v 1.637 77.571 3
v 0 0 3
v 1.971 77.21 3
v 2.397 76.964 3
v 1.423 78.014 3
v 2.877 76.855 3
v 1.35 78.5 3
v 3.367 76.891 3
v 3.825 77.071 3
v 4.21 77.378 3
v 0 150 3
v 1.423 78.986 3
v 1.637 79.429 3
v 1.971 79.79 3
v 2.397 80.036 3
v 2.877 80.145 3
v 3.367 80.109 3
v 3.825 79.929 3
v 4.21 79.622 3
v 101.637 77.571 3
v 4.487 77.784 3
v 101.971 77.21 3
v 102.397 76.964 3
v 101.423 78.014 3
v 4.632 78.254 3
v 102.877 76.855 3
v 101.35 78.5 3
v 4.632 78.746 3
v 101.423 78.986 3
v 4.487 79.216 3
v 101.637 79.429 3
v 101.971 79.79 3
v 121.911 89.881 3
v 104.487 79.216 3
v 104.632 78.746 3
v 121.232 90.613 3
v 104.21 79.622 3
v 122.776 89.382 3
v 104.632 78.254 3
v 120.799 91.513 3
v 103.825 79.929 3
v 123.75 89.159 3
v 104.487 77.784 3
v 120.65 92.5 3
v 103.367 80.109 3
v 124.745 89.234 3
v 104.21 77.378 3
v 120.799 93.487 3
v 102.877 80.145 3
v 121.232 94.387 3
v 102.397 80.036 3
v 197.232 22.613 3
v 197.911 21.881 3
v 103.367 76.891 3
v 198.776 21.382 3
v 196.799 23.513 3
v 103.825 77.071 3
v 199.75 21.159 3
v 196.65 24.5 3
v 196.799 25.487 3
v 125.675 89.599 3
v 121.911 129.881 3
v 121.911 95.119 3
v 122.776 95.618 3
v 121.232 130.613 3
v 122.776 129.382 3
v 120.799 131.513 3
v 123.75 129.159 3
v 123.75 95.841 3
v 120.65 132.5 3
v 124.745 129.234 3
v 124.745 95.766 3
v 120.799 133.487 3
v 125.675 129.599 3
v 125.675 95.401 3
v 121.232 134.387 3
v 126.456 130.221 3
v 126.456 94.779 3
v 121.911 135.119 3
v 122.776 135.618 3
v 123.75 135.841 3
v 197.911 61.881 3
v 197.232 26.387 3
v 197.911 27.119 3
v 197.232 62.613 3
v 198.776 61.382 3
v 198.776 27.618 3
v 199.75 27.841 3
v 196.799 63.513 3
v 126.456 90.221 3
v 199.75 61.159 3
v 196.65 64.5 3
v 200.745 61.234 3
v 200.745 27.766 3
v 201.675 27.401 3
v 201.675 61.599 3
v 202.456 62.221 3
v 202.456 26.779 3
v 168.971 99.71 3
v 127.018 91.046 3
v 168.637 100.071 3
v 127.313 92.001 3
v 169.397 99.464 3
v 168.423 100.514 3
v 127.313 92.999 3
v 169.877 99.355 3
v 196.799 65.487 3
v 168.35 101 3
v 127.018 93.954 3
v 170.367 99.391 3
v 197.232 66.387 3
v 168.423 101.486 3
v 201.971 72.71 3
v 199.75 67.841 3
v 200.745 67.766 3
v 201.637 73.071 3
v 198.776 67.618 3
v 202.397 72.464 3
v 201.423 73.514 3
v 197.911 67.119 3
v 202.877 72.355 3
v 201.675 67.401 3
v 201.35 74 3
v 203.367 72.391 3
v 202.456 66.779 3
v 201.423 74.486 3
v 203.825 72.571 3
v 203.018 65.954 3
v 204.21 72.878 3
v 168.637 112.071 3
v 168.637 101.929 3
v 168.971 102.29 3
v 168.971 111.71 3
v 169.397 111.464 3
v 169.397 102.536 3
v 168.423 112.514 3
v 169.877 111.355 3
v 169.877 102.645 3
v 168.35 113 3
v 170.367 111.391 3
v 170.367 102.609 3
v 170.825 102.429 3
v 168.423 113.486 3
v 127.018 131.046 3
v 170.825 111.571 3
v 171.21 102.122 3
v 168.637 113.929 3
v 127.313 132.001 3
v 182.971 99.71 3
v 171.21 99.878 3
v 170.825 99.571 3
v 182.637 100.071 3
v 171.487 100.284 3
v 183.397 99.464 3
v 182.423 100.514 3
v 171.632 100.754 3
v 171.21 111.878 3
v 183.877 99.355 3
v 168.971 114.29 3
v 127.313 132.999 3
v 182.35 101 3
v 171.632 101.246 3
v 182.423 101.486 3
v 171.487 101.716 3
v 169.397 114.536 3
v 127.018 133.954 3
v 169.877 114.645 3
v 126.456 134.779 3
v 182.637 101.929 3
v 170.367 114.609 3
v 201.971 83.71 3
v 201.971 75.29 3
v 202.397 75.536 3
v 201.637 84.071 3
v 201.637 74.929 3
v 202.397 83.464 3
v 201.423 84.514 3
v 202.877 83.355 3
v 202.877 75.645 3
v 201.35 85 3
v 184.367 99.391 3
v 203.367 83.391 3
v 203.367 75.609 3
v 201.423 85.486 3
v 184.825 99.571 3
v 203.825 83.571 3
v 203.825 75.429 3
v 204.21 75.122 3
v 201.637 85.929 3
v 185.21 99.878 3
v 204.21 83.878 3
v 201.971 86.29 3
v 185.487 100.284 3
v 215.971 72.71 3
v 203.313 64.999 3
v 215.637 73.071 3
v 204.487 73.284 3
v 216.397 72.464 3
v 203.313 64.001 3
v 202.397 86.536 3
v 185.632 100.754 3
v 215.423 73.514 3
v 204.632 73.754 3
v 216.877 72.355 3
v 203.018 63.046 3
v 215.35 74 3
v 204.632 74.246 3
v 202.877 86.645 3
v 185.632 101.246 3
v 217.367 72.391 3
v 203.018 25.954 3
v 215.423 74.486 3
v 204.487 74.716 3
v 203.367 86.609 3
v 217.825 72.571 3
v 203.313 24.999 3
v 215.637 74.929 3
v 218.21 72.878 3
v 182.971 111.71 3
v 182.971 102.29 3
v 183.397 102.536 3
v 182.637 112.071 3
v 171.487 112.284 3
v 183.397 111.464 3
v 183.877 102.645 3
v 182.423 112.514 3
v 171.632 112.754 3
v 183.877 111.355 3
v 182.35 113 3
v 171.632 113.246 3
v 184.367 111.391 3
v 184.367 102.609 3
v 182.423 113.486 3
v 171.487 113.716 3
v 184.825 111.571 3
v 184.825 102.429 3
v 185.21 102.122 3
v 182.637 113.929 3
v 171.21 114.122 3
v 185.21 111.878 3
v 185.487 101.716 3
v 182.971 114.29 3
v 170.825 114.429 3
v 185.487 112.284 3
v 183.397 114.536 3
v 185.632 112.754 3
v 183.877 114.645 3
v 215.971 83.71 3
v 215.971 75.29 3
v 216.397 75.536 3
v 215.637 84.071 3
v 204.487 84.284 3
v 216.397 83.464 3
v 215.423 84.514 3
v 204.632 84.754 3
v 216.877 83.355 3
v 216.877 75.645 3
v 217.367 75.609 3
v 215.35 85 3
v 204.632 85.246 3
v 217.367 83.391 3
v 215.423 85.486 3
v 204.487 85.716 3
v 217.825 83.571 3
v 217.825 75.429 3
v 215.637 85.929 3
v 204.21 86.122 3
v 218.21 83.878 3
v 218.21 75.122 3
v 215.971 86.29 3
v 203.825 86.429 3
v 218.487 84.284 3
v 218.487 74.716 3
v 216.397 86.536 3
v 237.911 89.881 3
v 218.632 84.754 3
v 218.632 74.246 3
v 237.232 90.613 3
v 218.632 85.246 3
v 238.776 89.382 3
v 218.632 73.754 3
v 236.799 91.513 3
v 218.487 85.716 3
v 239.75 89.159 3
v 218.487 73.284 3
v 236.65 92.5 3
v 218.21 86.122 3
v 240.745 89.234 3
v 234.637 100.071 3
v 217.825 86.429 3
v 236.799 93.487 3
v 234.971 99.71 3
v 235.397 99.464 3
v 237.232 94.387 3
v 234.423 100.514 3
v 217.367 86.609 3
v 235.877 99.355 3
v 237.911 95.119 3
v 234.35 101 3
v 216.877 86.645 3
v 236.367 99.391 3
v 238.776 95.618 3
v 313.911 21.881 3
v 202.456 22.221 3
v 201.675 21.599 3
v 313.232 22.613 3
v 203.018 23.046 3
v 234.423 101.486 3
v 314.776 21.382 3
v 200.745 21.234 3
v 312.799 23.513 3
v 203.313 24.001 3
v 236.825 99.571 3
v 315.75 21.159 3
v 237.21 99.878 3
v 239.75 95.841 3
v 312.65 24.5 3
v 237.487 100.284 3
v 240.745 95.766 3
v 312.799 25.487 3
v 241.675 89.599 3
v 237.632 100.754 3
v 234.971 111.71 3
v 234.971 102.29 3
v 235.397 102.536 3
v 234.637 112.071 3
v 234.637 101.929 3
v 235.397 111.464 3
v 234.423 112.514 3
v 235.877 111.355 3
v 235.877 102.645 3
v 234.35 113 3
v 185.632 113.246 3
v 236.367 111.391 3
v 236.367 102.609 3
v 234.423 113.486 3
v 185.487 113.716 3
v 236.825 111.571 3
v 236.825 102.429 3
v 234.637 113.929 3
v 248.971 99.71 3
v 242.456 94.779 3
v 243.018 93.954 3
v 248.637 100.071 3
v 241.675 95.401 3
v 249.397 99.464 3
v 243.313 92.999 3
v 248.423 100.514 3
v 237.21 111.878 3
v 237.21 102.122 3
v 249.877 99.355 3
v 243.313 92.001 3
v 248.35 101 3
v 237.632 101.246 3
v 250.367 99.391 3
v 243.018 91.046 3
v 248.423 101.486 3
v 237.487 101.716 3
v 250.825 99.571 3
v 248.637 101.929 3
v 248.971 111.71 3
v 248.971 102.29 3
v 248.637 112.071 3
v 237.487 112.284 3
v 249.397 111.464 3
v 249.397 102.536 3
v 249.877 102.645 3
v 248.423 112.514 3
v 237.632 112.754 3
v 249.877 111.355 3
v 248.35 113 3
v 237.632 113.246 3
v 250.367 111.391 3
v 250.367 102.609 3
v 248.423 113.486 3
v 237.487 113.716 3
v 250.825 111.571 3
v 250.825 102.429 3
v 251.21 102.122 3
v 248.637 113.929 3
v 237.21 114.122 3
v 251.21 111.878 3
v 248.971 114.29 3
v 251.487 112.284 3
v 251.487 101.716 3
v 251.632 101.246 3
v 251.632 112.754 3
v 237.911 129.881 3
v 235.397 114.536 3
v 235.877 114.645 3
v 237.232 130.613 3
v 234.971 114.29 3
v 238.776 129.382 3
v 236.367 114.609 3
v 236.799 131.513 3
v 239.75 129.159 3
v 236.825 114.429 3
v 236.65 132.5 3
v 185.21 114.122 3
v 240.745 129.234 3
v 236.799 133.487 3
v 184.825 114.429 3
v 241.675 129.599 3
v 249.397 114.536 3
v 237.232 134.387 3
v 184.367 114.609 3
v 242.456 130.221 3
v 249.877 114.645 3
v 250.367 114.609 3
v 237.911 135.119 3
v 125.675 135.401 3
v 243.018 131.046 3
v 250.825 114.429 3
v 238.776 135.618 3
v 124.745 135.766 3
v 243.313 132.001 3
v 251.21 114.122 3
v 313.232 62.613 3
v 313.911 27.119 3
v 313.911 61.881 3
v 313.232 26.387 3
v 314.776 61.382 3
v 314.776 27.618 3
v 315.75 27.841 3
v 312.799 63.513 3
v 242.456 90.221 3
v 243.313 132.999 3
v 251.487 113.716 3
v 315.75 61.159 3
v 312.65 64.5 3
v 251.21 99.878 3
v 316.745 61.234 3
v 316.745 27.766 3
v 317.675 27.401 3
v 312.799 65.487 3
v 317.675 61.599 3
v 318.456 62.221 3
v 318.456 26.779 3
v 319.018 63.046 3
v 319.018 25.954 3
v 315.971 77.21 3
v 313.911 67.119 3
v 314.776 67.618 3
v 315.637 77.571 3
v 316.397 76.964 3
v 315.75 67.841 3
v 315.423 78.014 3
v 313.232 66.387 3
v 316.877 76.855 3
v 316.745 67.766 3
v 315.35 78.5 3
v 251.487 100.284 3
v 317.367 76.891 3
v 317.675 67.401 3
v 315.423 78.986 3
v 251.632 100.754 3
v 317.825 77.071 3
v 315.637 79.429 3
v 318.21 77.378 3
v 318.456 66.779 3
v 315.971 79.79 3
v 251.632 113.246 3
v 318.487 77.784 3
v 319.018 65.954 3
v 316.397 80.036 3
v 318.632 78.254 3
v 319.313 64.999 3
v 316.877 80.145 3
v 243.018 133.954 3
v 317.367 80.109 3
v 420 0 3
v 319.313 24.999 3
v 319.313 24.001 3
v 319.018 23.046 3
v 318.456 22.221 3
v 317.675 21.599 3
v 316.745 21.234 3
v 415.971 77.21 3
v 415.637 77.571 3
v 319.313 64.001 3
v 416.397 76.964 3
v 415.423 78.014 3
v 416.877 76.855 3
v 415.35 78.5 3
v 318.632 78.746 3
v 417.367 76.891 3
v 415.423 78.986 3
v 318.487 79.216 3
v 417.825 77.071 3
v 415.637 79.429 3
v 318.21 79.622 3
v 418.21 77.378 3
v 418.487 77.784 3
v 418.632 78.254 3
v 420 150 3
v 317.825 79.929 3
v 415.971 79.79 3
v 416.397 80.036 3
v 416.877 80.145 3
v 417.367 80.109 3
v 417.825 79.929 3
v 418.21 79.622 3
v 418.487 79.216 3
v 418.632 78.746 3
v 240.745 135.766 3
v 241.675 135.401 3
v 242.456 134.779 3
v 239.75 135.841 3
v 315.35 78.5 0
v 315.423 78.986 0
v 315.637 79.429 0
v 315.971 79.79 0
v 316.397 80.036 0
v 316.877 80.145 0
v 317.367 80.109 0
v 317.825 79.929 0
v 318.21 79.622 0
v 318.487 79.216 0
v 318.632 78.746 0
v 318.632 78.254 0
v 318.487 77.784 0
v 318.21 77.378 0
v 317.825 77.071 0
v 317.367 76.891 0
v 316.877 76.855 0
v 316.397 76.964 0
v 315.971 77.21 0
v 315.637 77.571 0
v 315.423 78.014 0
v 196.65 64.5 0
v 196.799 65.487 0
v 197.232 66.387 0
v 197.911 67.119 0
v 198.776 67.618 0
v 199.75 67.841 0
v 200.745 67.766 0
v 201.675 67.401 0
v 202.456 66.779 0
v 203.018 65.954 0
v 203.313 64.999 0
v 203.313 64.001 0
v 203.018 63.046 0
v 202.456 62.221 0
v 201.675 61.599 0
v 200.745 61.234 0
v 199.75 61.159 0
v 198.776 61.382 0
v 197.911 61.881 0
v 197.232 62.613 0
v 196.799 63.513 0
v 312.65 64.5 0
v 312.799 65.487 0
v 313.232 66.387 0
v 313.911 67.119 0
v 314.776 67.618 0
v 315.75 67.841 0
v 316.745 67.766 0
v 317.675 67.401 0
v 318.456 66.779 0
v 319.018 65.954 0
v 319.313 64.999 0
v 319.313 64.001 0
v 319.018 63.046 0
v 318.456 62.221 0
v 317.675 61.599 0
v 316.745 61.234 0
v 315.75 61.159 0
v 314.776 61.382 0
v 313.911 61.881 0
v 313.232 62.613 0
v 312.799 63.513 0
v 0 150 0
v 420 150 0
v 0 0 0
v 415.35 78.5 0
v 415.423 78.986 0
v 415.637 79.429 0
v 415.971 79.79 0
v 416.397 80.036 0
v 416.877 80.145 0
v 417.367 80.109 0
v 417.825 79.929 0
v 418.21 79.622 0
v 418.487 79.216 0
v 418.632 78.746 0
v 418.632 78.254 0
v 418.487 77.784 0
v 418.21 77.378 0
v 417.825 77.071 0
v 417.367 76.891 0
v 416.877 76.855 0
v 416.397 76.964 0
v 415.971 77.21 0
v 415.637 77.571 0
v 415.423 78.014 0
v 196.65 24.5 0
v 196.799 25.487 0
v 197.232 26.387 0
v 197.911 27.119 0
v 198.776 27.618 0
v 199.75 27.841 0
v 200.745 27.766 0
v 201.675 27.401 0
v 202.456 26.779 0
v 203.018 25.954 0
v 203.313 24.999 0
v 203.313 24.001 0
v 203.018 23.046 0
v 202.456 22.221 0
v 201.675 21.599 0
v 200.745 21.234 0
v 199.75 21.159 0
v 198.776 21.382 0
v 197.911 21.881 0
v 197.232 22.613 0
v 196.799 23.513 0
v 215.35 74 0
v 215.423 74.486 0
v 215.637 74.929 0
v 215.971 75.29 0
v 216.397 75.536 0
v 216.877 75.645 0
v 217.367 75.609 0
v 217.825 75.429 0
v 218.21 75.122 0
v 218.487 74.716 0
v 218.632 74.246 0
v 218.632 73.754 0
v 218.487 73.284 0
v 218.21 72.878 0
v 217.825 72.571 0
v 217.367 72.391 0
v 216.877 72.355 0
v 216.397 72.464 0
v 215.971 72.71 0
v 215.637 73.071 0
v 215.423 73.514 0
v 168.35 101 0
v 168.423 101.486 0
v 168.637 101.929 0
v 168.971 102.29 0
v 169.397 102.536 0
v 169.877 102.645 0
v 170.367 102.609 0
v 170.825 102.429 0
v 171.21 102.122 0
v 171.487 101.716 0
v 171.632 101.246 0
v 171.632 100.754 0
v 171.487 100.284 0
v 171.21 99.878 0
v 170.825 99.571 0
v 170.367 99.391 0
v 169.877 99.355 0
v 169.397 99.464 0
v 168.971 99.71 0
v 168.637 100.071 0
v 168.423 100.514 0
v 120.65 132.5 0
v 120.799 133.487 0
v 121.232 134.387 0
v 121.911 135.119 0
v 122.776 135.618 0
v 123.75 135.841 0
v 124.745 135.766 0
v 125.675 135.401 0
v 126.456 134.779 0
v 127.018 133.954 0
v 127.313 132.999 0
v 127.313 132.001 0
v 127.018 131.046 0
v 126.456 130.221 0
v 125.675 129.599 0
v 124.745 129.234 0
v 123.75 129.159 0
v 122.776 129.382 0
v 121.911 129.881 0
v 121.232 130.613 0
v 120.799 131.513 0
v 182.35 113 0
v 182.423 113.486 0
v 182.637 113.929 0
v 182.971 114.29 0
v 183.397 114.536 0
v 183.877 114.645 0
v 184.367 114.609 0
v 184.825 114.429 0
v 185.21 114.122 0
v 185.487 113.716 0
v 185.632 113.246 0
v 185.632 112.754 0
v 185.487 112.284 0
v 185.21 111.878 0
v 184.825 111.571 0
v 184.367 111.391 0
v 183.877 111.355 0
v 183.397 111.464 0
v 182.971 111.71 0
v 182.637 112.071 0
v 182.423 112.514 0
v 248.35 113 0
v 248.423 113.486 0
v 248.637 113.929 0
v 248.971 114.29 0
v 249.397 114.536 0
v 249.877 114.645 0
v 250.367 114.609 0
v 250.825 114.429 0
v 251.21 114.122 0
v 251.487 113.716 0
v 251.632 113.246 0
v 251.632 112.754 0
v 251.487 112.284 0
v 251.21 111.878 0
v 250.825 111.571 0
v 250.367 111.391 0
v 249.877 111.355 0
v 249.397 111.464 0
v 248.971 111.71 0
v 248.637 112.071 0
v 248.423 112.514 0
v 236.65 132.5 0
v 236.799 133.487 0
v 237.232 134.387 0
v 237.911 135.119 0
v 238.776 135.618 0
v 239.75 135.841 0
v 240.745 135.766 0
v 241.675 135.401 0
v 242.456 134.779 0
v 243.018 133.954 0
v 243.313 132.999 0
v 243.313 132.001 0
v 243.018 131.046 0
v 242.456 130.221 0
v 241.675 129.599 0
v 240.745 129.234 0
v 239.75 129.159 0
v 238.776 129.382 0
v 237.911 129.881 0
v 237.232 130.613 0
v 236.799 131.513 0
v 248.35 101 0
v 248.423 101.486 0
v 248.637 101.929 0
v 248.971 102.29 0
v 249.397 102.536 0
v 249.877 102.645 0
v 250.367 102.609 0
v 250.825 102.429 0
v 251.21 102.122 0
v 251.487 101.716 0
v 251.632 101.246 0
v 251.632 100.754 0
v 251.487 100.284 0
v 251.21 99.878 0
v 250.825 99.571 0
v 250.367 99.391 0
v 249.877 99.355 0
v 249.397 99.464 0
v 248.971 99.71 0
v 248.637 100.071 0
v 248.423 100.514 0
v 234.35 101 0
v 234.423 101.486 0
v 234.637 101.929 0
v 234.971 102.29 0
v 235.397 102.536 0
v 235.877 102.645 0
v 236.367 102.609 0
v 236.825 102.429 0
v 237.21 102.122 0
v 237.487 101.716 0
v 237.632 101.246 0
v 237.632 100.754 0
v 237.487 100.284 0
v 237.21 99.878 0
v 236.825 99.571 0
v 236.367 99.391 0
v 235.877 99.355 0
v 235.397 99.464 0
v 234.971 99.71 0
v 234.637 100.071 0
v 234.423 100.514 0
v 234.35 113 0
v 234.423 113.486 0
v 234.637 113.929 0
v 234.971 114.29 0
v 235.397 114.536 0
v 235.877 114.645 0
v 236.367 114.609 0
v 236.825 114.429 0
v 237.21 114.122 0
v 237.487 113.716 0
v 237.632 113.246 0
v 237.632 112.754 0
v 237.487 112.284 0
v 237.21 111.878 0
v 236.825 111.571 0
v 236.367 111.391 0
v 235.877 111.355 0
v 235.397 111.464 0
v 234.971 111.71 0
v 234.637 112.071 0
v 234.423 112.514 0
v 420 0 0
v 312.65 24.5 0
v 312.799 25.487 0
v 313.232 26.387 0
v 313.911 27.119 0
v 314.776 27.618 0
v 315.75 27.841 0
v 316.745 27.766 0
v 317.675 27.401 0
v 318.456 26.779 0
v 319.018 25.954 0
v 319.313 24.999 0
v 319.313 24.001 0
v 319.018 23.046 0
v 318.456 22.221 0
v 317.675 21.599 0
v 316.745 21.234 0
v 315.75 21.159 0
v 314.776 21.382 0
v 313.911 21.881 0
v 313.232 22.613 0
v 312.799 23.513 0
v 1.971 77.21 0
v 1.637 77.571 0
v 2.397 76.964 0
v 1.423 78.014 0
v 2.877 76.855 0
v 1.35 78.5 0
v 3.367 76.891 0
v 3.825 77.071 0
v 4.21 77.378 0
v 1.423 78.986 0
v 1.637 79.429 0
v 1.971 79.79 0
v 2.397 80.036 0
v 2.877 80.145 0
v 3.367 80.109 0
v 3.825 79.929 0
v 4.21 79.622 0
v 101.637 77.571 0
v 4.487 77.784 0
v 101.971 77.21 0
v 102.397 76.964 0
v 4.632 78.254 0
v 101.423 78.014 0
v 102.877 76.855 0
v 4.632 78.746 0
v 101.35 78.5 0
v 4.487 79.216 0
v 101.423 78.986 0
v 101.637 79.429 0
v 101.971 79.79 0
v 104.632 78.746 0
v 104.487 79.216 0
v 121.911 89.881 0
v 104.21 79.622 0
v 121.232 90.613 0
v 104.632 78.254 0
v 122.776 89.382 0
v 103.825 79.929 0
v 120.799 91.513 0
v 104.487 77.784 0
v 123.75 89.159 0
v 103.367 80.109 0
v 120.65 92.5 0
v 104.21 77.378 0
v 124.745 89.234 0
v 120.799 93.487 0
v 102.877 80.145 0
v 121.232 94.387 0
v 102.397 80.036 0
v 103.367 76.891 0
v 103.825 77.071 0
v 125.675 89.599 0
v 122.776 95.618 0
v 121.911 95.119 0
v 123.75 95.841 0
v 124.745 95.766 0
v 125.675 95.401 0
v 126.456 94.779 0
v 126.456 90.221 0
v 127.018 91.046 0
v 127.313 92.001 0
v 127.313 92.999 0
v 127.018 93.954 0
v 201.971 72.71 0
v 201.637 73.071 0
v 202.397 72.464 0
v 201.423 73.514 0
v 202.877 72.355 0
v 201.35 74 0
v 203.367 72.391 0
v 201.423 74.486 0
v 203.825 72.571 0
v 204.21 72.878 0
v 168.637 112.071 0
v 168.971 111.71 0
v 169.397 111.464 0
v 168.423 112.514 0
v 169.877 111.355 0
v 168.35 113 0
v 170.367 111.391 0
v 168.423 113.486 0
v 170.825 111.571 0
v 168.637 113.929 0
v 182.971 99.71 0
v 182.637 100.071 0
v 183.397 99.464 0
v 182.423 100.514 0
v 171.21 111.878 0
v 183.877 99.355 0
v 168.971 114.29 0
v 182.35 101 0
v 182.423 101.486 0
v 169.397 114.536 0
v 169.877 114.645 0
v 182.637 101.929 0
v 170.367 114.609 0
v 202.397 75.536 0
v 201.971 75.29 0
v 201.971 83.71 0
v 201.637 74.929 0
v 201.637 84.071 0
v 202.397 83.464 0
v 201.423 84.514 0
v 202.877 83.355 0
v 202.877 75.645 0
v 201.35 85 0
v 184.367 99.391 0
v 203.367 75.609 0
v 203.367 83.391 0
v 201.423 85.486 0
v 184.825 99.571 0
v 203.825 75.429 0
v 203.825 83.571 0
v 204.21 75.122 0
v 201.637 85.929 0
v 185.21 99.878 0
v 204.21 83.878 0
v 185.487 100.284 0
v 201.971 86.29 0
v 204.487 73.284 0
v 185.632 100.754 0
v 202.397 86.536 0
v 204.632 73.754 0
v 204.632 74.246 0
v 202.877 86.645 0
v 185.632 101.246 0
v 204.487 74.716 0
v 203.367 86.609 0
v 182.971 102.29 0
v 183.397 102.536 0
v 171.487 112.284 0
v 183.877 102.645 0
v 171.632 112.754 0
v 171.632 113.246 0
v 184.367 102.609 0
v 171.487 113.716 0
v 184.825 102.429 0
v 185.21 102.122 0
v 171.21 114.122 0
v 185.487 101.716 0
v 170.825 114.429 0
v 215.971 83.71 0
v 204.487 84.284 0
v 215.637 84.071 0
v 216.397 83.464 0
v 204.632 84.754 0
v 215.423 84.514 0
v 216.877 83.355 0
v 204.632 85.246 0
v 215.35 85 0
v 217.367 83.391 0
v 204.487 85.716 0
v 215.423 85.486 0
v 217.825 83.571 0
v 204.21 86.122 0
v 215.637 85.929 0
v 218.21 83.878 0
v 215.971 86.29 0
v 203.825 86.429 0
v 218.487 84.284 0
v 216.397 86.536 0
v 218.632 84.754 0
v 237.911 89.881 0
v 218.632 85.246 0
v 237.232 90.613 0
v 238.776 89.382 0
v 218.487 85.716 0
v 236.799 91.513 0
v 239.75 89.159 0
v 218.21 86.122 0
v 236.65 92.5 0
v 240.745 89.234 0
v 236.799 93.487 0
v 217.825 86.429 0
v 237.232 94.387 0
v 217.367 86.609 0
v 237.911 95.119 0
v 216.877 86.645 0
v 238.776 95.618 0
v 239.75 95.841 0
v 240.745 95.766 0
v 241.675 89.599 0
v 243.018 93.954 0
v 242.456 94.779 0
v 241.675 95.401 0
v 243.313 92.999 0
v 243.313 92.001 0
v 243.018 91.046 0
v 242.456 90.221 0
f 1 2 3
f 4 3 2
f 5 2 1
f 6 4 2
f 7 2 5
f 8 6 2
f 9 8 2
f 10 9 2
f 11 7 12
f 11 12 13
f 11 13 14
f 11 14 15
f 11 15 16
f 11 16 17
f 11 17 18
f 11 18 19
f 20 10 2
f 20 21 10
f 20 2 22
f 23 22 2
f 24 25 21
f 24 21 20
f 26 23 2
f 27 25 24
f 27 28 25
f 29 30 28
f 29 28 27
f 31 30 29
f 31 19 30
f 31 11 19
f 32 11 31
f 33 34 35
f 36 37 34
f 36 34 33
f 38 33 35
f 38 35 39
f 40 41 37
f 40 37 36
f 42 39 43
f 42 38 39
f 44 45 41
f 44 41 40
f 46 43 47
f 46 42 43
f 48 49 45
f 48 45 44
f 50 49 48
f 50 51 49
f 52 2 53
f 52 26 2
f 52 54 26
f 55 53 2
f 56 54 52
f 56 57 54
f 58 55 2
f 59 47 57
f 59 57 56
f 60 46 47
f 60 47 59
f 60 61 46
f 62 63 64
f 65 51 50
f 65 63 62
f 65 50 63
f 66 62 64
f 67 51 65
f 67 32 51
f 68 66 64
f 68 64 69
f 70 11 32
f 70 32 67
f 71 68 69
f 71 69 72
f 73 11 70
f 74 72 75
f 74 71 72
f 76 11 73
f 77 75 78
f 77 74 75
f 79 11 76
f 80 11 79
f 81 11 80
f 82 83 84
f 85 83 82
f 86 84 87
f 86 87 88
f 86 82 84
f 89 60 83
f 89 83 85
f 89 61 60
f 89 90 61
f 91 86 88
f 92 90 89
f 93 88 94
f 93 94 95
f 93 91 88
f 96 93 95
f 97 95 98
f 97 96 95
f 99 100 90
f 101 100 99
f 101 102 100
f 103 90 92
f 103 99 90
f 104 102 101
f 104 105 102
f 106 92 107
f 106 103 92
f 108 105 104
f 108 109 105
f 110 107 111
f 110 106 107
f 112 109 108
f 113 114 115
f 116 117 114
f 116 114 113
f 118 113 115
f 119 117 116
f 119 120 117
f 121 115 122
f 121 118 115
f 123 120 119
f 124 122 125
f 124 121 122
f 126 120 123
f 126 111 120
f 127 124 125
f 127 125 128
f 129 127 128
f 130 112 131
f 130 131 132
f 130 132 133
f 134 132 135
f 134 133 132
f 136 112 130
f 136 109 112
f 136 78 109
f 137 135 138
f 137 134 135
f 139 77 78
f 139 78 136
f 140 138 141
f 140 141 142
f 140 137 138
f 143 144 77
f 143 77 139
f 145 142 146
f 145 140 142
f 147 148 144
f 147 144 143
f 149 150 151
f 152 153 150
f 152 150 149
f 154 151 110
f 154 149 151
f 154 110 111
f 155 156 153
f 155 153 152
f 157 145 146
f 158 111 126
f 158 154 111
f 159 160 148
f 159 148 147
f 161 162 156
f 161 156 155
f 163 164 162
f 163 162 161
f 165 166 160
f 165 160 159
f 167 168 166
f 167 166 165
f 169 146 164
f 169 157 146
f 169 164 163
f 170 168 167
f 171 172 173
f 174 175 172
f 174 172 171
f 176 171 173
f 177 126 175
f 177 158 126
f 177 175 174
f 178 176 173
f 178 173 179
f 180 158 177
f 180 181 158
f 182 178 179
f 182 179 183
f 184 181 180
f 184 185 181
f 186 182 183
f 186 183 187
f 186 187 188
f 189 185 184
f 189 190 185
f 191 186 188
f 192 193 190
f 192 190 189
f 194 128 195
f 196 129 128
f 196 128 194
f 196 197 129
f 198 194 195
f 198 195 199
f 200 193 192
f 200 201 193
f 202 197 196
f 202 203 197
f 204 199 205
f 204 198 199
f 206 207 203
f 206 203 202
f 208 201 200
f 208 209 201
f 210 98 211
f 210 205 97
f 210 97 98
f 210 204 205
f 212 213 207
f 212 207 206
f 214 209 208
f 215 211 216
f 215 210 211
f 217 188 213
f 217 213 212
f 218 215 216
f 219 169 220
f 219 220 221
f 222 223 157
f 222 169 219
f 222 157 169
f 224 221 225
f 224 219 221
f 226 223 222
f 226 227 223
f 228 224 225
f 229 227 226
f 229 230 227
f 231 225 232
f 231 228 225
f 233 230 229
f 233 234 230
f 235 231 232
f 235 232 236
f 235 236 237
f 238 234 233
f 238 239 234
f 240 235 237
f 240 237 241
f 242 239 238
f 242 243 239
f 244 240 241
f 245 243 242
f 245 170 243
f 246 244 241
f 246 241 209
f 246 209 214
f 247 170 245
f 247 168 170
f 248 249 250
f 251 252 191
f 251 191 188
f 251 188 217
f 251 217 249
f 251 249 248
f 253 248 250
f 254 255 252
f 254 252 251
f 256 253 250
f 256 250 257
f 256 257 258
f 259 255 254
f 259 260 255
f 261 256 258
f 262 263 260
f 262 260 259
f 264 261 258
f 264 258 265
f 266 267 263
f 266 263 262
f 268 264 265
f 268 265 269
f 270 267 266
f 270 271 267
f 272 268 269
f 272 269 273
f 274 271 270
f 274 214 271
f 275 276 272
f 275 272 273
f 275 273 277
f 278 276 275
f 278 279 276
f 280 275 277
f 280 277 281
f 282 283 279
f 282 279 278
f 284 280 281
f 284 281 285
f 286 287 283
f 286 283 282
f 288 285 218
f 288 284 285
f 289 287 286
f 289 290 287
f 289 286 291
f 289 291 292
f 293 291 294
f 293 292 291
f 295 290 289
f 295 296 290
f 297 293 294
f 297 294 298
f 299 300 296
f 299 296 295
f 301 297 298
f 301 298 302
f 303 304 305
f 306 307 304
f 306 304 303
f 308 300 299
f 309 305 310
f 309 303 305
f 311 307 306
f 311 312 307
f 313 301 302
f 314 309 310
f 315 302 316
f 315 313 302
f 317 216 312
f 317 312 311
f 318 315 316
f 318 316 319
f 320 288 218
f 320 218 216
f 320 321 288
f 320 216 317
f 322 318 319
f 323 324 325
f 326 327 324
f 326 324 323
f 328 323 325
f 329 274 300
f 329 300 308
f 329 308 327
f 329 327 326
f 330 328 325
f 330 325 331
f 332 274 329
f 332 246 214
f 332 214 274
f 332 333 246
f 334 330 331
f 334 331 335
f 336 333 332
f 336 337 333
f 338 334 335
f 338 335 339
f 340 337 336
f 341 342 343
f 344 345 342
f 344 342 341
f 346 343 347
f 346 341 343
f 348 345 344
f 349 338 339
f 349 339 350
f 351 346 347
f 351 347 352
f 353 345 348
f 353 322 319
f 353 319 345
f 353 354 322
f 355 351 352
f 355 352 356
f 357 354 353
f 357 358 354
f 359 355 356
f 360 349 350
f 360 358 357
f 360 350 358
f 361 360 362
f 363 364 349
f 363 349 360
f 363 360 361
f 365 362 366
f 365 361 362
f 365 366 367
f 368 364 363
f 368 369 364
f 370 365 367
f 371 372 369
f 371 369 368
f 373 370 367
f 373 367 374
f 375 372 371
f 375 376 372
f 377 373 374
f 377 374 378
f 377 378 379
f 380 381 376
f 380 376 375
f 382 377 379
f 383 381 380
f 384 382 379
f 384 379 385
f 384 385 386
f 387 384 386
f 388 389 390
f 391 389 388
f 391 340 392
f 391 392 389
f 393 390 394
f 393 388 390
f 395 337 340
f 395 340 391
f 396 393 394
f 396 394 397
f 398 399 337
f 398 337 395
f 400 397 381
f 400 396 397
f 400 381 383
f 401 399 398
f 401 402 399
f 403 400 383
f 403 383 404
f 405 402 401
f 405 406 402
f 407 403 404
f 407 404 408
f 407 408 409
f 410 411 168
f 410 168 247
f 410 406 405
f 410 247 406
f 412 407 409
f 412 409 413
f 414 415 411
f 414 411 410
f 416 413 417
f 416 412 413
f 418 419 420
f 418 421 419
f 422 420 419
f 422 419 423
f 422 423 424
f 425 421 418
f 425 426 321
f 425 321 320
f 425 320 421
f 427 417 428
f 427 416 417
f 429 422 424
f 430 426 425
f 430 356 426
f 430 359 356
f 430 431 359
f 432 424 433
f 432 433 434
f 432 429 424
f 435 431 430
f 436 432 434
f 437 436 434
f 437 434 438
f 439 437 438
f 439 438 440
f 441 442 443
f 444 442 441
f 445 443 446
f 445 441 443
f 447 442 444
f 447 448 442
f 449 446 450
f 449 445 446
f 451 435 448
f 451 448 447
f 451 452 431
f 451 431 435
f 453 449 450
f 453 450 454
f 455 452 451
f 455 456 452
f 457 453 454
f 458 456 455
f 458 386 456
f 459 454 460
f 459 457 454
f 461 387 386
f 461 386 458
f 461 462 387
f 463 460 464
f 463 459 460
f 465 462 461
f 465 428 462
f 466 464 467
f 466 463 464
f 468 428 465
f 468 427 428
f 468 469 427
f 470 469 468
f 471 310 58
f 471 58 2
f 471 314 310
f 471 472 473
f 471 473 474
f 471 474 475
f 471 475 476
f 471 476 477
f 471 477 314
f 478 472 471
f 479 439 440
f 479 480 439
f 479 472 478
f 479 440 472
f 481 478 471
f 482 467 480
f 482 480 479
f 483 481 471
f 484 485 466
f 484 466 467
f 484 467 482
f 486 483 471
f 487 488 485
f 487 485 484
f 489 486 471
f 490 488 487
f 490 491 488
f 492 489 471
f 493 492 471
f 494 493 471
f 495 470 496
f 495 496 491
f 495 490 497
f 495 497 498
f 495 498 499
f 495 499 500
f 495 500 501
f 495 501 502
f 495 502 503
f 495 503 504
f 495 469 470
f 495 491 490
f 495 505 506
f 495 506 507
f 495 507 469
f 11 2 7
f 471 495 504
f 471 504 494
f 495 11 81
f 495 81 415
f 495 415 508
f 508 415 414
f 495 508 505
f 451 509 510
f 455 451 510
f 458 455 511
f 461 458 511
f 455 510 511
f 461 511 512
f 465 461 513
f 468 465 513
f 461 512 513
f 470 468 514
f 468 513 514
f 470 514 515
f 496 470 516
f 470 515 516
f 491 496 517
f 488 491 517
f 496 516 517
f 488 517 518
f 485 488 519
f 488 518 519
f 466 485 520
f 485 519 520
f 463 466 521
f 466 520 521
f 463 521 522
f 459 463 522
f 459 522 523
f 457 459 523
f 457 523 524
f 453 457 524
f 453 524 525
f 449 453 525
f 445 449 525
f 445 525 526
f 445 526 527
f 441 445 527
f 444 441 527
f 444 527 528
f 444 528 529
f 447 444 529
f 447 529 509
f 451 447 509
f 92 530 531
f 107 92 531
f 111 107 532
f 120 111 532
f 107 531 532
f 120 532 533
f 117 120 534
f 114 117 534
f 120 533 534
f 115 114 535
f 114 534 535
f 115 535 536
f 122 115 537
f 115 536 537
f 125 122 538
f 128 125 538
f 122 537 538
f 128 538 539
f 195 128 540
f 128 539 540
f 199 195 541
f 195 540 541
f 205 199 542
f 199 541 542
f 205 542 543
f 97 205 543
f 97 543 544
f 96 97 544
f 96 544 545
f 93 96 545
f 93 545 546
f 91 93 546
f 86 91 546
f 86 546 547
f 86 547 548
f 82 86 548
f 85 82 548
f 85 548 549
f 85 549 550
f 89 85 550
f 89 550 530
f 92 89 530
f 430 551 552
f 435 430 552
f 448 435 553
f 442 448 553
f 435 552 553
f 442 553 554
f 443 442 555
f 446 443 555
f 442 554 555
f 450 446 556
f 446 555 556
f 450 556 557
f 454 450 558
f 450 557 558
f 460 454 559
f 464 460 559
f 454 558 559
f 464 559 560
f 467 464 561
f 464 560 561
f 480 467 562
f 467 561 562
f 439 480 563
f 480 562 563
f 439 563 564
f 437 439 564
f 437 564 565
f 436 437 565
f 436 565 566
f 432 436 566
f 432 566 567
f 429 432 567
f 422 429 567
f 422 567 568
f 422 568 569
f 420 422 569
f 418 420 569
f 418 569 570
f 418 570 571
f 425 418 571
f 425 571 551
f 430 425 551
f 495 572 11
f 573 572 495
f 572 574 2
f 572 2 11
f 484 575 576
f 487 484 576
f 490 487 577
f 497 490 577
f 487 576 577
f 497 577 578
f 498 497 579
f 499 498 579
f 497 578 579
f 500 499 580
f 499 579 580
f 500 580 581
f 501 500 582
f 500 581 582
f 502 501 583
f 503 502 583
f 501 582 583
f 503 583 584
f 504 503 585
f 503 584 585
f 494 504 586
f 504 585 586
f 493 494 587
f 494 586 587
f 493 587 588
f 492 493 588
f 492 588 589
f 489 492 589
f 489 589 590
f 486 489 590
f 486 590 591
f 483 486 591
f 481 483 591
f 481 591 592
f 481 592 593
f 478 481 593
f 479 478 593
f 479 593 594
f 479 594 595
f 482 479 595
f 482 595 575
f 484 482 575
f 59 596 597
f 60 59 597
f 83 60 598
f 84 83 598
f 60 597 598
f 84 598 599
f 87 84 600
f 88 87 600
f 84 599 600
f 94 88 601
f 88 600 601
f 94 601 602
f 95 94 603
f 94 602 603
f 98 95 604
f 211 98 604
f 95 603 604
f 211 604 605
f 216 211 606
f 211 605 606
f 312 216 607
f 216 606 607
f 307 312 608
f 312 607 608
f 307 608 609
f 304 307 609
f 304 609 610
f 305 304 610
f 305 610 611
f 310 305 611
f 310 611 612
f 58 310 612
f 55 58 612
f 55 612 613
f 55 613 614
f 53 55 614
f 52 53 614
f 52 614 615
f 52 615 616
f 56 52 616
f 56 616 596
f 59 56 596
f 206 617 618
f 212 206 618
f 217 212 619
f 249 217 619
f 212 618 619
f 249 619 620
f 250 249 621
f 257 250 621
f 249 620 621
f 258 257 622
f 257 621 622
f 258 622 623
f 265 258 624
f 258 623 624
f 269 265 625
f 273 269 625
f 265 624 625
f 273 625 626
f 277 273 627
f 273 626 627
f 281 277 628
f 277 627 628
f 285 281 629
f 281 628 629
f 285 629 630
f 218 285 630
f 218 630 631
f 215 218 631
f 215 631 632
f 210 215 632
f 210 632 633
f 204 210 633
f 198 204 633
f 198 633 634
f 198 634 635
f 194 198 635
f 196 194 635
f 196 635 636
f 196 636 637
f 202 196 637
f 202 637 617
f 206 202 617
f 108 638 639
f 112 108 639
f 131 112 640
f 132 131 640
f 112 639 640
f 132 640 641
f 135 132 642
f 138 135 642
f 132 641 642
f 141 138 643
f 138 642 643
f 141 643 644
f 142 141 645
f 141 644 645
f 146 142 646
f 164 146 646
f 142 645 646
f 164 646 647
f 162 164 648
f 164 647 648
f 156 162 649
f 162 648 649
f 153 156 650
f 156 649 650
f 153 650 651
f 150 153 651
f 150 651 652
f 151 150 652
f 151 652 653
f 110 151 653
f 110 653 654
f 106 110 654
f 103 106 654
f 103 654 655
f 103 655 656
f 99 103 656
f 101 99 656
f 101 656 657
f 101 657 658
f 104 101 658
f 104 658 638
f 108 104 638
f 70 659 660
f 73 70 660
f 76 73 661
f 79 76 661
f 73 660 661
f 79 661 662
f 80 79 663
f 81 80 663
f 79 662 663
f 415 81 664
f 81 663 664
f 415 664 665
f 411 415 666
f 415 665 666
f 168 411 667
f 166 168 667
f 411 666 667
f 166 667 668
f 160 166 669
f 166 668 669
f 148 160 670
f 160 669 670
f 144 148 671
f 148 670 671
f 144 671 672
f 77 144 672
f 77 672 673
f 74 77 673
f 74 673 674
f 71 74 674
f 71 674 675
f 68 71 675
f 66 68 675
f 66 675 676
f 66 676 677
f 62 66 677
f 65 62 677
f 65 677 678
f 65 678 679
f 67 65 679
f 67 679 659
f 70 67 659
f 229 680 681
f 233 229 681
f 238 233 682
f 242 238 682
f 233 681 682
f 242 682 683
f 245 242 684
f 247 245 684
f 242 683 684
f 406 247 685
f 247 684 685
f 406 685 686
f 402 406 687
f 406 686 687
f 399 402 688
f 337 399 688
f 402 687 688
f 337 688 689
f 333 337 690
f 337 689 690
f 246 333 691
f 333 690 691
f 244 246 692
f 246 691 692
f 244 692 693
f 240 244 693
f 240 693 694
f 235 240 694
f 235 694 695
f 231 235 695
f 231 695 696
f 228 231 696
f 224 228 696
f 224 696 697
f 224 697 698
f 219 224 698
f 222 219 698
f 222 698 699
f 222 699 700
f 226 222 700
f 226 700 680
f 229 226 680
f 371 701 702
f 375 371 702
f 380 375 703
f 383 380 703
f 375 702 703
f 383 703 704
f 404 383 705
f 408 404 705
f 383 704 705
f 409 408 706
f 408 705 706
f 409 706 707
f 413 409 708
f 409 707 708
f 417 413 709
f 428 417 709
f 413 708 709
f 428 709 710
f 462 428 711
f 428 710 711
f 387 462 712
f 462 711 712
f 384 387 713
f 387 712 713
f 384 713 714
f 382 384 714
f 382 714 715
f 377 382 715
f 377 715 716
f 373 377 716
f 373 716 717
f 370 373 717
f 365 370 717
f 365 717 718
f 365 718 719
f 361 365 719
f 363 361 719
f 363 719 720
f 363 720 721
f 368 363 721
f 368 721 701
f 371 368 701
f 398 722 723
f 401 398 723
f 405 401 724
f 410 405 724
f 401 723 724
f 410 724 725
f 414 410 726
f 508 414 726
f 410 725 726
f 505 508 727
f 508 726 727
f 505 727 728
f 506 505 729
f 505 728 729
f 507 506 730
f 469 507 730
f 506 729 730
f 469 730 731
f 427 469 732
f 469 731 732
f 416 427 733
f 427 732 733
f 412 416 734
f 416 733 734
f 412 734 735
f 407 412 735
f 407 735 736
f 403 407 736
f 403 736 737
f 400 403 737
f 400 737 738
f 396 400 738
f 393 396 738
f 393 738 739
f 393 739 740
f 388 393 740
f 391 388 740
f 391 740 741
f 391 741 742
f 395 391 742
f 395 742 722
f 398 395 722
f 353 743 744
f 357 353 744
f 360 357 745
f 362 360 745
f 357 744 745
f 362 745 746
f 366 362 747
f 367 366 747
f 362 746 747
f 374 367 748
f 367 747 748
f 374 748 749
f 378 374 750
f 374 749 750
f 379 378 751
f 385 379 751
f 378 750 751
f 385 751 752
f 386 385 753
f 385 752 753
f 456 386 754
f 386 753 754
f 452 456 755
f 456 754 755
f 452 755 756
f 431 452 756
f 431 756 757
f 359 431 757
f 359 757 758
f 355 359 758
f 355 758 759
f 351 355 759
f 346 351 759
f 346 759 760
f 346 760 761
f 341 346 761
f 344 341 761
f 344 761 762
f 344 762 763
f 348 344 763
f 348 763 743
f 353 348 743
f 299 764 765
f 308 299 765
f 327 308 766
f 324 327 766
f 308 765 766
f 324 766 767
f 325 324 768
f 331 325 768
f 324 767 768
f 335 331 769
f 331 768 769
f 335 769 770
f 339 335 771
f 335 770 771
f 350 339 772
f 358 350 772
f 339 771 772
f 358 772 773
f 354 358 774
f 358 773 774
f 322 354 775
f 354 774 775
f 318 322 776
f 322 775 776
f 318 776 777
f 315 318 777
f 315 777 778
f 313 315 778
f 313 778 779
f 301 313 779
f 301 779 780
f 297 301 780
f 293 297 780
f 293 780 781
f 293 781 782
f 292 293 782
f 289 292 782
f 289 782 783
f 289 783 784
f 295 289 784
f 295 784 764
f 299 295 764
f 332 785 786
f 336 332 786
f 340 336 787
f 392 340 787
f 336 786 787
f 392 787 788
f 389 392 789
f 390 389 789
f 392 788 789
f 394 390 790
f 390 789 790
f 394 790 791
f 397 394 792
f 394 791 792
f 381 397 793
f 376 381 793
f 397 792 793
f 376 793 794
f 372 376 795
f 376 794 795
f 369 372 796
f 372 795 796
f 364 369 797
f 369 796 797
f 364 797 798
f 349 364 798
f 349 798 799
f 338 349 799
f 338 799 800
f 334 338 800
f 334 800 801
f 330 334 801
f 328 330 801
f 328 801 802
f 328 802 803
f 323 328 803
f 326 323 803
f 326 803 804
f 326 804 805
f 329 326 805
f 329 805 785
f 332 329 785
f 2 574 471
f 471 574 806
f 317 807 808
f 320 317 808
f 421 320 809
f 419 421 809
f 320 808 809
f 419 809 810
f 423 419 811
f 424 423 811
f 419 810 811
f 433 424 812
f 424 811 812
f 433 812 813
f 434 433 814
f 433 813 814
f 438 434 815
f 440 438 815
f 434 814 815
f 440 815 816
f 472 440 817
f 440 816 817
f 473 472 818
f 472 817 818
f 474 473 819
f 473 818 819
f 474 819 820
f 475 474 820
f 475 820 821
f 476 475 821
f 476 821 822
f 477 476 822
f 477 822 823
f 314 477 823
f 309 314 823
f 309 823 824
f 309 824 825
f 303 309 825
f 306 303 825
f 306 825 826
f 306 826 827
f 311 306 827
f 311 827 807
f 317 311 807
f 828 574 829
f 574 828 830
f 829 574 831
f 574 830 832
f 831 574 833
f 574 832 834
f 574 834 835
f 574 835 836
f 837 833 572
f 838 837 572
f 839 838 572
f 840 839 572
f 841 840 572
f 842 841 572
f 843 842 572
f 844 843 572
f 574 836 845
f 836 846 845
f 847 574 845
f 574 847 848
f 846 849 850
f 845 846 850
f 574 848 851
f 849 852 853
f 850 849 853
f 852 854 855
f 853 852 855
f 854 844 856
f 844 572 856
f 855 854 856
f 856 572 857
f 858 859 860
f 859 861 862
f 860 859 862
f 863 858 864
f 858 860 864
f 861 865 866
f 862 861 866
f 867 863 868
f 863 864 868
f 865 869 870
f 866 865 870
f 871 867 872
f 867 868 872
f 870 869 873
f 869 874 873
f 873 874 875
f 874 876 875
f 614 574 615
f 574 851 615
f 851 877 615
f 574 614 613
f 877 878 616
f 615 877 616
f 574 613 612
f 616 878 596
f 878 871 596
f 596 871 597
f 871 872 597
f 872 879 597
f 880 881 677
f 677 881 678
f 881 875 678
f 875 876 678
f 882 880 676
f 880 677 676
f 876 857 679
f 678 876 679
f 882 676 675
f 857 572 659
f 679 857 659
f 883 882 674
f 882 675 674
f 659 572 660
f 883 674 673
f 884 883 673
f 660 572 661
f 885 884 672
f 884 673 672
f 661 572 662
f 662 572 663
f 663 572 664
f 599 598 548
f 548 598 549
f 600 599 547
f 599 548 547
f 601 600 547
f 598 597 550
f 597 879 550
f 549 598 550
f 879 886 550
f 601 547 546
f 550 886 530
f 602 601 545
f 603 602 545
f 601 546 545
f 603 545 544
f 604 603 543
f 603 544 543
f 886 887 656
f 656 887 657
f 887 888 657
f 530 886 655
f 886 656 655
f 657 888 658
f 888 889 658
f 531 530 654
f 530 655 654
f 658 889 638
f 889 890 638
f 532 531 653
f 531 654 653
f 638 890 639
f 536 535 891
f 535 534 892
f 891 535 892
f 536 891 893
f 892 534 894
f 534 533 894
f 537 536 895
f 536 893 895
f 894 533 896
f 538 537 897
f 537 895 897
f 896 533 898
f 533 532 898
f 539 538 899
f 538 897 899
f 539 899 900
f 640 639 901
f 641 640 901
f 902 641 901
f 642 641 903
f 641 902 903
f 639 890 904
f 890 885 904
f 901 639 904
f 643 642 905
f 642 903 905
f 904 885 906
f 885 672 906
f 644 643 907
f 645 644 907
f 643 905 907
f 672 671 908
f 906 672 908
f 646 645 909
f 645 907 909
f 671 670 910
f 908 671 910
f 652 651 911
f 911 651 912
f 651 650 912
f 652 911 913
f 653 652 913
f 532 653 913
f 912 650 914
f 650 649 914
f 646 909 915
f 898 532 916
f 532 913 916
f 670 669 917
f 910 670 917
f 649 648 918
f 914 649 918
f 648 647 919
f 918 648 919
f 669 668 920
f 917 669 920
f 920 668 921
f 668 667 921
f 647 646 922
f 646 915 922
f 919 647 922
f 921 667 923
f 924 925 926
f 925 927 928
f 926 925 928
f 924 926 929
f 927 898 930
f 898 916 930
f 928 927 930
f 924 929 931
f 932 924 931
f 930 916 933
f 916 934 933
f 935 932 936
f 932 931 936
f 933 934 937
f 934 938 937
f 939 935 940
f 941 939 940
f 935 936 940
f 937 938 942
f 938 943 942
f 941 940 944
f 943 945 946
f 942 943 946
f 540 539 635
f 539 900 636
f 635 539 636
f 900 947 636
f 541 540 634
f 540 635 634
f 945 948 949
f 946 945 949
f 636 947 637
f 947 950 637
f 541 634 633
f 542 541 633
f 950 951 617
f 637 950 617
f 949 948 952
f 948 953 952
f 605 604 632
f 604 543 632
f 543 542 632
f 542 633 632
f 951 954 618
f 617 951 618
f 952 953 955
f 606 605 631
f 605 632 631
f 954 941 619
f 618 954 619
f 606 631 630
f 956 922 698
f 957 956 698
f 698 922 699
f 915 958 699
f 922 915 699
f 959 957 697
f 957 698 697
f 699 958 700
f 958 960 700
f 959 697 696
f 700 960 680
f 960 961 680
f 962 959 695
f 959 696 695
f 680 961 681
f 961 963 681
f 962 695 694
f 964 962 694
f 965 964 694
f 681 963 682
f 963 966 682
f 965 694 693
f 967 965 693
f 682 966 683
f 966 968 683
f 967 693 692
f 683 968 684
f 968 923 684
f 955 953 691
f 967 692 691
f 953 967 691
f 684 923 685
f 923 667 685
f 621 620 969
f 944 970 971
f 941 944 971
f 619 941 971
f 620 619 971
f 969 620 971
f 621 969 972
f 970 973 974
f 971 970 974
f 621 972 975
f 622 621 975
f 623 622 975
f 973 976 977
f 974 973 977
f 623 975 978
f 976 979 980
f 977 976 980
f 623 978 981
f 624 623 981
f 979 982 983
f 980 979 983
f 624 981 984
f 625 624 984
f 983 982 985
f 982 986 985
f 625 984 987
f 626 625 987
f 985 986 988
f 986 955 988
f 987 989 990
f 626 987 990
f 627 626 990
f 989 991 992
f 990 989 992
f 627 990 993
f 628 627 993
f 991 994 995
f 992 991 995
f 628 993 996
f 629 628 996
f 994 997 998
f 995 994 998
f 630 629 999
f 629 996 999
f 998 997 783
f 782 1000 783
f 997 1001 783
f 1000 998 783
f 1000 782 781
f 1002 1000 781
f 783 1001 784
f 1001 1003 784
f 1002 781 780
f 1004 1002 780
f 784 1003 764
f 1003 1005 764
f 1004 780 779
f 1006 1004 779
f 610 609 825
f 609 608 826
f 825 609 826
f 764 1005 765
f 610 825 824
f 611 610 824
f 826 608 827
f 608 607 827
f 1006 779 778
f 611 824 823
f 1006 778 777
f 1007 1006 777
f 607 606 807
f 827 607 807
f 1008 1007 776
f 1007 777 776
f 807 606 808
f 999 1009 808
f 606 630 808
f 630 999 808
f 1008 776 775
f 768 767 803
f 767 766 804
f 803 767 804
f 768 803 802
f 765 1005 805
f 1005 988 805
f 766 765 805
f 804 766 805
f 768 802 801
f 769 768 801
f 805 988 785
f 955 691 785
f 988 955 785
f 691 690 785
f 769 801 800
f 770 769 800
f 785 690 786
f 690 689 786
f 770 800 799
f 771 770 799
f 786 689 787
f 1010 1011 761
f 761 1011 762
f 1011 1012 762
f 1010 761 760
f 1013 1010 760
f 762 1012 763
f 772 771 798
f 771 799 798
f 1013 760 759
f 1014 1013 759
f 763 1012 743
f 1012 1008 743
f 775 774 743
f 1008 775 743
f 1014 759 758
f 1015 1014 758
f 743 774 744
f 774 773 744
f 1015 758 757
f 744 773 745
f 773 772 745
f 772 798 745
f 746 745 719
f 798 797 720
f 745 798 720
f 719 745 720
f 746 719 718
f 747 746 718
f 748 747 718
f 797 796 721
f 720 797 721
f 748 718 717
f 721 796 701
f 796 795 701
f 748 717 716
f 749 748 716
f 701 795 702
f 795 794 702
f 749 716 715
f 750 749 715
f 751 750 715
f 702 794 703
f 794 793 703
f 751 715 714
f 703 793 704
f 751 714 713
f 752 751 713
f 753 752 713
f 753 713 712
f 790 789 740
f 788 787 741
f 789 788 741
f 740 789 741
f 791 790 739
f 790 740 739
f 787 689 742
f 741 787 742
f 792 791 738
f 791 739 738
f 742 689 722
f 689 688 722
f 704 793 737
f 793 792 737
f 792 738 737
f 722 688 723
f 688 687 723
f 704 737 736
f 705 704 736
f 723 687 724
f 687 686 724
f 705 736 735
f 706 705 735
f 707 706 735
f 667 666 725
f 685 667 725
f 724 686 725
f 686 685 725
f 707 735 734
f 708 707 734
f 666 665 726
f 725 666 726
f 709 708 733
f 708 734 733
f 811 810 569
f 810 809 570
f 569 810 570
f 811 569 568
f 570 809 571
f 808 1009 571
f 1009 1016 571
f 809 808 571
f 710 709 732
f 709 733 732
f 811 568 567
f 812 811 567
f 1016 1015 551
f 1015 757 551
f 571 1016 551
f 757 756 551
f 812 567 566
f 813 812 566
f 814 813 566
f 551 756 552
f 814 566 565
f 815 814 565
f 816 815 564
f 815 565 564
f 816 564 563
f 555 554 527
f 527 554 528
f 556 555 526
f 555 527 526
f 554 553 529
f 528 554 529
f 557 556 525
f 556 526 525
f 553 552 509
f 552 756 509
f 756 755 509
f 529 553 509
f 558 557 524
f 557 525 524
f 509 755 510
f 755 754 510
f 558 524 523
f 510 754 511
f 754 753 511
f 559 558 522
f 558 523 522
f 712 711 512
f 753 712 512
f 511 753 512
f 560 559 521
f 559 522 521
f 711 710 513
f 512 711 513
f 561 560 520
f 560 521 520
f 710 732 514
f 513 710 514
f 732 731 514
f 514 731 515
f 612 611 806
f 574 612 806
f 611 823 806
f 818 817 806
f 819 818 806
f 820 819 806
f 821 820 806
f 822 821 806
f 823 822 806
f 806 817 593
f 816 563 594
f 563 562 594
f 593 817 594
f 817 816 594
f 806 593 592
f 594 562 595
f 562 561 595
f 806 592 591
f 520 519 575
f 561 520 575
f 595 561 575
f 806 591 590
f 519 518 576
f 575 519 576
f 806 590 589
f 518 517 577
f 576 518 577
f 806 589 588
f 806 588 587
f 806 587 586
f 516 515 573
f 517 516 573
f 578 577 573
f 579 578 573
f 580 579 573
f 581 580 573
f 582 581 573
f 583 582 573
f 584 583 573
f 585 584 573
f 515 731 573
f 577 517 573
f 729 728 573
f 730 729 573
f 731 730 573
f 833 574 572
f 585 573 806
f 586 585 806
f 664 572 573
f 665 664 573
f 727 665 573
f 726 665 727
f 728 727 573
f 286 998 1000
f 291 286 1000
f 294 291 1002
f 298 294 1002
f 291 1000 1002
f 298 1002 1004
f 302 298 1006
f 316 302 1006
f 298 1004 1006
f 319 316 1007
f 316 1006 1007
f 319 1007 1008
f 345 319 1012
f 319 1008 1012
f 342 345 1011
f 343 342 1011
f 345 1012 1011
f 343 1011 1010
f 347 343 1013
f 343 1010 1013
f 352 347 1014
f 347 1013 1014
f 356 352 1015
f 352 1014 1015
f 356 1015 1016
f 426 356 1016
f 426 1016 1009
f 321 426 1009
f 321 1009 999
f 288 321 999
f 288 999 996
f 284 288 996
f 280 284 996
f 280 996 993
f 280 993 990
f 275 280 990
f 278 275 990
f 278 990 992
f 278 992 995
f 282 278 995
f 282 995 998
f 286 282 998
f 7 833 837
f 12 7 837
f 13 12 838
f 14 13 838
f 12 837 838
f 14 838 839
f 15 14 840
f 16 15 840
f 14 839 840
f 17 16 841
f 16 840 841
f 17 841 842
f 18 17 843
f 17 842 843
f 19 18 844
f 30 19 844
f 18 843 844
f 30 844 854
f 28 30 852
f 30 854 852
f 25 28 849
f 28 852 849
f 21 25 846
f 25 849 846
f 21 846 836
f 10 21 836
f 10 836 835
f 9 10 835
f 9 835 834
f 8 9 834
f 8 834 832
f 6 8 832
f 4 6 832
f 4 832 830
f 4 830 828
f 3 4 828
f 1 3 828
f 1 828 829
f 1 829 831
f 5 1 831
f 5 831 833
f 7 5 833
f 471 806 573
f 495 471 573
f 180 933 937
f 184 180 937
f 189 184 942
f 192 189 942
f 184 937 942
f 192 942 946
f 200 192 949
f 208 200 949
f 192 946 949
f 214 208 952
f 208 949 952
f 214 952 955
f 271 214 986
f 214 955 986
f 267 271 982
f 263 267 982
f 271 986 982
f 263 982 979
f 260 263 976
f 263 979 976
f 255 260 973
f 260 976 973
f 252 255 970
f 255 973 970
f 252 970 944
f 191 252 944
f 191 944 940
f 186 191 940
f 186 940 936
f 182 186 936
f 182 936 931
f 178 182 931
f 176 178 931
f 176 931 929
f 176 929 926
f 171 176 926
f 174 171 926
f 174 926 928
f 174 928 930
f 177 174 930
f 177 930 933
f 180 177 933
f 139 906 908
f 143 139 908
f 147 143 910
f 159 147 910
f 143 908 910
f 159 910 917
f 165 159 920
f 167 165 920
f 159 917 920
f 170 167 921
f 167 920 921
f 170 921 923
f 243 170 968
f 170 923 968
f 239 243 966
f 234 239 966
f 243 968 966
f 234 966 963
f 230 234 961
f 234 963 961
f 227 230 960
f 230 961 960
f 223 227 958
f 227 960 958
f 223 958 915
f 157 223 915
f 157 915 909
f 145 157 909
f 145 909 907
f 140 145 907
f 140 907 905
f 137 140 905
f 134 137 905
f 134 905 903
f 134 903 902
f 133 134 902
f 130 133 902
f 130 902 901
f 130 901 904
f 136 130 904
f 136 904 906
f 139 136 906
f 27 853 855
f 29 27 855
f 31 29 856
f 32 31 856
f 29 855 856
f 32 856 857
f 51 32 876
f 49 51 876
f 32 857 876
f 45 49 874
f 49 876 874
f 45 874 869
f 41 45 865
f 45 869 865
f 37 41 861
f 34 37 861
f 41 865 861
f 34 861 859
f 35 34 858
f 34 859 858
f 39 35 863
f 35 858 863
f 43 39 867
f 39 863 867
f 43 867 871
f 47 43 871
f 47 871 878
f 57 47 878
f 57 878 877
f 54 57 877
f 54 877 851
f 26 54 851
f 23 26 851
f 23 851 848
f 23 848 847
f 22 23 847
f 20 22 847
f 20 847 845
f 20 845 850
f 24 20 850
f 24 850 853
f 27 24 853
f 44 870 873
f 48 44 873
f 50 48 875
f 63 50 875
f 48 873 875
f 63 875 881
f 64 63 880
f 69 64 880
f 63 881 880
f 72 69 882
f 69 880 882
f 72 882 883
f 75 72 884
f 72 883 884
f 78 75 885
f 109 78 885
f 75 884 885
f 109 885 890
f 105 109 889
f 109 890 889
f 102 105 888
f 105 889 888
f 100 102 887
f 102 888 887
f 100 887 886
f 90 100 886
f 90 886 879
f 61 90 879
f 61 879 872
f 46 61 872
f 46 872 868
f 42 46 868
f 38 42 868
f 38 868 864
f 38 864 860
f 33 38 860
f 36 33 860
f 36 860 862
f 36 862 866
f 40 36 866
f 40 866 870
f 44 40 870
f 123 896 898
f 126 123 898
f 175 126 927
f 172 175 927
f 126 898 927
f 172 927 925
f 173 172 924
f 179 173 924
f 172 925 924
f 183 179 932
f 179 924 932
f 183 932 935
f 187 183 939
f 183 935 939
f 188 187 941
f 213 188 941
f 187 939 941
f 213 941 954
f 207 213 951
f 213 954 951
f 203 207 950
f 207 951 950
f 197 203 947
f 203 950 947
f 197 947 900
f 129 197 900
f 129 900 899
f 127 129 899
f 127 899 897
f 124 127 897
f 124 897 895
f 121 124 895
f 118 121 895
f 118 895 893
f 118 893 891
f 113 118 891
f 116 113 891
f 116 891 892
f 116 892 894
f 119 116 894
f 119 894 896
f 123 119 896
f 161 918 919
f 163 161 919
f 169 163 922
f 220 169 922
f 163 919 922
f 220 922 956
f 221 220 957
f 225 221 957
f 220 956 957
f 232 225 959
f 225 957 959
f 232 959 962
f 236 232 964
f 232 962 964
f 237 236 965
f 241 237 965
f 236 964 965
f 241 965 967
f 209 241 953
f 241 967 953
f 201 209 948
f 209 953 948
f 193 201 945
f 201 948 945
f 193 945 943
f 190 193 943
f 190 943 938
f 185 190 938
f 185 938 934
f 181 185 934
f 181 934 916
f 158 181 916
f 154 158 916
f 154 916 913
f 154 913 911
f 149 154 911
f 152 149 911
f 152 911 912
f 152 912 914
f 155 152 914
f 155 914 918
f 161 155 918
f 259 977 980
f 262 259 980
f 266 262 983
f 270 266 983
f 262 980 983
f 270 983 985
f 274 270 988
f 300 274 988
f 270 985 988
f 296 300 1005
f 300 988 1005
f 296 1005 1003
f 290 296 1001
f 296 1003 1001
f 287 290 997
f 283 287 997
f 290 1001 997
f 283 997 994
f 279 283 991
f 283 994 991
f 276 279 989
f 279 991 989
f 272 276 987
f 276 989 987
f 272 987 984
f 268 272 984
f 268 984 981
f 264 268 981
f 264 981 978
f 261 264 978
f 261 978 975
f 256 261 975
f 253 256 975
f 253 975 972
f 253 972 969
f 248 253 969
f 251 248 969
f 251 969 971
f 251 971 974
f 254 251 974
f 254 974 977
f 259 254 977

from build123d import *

# Parameters (mm, degrees)
SKETCH_2_W          = 420
SKETCH_2_H          = 180
EXTRUDE_1_DEPTH     = 3
SKETCH_3_W          = 420
SKETCH_3_H          = 3
CUT_EXTRUDE_1_DEPTH = 30
SKETCH_4_R          = 1.65
SKETCH_4_R_2        = 3.35
CUT_EXTRUDE_2_DEPTH = 40


with BuildPart() as part:
    # 草图2 → 凸台-拉伸1 (new body)
    with BuildSketch(Plane.XY):
        with Locations((210, 90)):
            Rectangle(SKETCH_2_W, SKETCH_2_H)
    extrude(amount=EXTRUDE_1_DEPTH)

    # 草图3 → 切除-拉伸1 (cut)
    with BuildSketch(Plane(origin=(0, 180, 0), x_dir=(1, 0, 0), z_dir=(0, 1, 0))):
        with Locations((210, -1.5)):
            Rectangle(SKETCH_3_W, SKETCH_3_H)
    extrude(amount=-CUT_EXTRUDE_1_DEPTH, mode=Mode.SUBTRACT)

    # 草图4 → 切除-拉伸2 (cut)
    with BuildSketch(Plane(origin=(0, 0, 0), x_dir=(-1, 0, 0), z_dir=(0, 0, -1))):
        with Locations((-250, 101)):
            Circle(SKETCH_4_R)
        with Locations((-250, 113)):
            Circle(SKETCH_4_R)
        with Locations((-236, 101)):
            Circle(SKETCH_4_R)
        with Locations((-236, 113)):
            Circle(SKETCH_4_R)
        with Locations((-217, 85)):
            Circle(SKETCH_4_R)
        with Locations((-217, 74)):
            Circle(SKETCH_4_R)
        with Locations((-203, 85)):
            Circle(SKETCH_4_R)
        with Locations((-203, 74)):
            Circle(SKETCH_4_R)
        with Locations((-184, 113)):
            Circle(SKETCH_4_R)
        with Locations((-184, 101)):
            Circle(SKETCH_4_R)
        with Locations((-170, 101)):
            Circle(SKETCH_4_R)
        with Locations((-170, 113)):
            Circle(SKETCH_4_R)
        with Locations((-417, 78.5)):
            Circle(SKETCH_4_R)
        with Locations((-317, 78.5)):
            Circle(SKETCH_4_R)
        with Locations((-3, 78.5)):
            Circle(SKETCH_4_R)
        with Locations((-103, 78.5)):
            Circle(SKETCH_4_R)
        with Locations((-316, 64.5)):
            Circle(SKETCH_4_R_2)
        with Locations((-316, 24.5)):
            Circle(SKETCH_4_R_2)
        with Locations((-200, 24.5)):
            Circle(SKETCH_4_R_2)
        with Locations((-200, 64.5)):
            Circle(SKETCH_4_R_2)
        with Locations((-240, 132.5)):
            Circle(SKETCH_4_R_2)
        with Locations((-240, 92.5)):
            Circle(SKETCH_4_R_2)
        with Locations((-124, 132.5)):
            Circle(SKETCH_4_R_2)
        with Locations((-124, 92.5)):
            Circle(SKETCH_4_R_2)
    extrude(amount=-CUT_EXTRUDE_2_DEPTH, mode=Mode.SUBTRACT)


solid = part.part
